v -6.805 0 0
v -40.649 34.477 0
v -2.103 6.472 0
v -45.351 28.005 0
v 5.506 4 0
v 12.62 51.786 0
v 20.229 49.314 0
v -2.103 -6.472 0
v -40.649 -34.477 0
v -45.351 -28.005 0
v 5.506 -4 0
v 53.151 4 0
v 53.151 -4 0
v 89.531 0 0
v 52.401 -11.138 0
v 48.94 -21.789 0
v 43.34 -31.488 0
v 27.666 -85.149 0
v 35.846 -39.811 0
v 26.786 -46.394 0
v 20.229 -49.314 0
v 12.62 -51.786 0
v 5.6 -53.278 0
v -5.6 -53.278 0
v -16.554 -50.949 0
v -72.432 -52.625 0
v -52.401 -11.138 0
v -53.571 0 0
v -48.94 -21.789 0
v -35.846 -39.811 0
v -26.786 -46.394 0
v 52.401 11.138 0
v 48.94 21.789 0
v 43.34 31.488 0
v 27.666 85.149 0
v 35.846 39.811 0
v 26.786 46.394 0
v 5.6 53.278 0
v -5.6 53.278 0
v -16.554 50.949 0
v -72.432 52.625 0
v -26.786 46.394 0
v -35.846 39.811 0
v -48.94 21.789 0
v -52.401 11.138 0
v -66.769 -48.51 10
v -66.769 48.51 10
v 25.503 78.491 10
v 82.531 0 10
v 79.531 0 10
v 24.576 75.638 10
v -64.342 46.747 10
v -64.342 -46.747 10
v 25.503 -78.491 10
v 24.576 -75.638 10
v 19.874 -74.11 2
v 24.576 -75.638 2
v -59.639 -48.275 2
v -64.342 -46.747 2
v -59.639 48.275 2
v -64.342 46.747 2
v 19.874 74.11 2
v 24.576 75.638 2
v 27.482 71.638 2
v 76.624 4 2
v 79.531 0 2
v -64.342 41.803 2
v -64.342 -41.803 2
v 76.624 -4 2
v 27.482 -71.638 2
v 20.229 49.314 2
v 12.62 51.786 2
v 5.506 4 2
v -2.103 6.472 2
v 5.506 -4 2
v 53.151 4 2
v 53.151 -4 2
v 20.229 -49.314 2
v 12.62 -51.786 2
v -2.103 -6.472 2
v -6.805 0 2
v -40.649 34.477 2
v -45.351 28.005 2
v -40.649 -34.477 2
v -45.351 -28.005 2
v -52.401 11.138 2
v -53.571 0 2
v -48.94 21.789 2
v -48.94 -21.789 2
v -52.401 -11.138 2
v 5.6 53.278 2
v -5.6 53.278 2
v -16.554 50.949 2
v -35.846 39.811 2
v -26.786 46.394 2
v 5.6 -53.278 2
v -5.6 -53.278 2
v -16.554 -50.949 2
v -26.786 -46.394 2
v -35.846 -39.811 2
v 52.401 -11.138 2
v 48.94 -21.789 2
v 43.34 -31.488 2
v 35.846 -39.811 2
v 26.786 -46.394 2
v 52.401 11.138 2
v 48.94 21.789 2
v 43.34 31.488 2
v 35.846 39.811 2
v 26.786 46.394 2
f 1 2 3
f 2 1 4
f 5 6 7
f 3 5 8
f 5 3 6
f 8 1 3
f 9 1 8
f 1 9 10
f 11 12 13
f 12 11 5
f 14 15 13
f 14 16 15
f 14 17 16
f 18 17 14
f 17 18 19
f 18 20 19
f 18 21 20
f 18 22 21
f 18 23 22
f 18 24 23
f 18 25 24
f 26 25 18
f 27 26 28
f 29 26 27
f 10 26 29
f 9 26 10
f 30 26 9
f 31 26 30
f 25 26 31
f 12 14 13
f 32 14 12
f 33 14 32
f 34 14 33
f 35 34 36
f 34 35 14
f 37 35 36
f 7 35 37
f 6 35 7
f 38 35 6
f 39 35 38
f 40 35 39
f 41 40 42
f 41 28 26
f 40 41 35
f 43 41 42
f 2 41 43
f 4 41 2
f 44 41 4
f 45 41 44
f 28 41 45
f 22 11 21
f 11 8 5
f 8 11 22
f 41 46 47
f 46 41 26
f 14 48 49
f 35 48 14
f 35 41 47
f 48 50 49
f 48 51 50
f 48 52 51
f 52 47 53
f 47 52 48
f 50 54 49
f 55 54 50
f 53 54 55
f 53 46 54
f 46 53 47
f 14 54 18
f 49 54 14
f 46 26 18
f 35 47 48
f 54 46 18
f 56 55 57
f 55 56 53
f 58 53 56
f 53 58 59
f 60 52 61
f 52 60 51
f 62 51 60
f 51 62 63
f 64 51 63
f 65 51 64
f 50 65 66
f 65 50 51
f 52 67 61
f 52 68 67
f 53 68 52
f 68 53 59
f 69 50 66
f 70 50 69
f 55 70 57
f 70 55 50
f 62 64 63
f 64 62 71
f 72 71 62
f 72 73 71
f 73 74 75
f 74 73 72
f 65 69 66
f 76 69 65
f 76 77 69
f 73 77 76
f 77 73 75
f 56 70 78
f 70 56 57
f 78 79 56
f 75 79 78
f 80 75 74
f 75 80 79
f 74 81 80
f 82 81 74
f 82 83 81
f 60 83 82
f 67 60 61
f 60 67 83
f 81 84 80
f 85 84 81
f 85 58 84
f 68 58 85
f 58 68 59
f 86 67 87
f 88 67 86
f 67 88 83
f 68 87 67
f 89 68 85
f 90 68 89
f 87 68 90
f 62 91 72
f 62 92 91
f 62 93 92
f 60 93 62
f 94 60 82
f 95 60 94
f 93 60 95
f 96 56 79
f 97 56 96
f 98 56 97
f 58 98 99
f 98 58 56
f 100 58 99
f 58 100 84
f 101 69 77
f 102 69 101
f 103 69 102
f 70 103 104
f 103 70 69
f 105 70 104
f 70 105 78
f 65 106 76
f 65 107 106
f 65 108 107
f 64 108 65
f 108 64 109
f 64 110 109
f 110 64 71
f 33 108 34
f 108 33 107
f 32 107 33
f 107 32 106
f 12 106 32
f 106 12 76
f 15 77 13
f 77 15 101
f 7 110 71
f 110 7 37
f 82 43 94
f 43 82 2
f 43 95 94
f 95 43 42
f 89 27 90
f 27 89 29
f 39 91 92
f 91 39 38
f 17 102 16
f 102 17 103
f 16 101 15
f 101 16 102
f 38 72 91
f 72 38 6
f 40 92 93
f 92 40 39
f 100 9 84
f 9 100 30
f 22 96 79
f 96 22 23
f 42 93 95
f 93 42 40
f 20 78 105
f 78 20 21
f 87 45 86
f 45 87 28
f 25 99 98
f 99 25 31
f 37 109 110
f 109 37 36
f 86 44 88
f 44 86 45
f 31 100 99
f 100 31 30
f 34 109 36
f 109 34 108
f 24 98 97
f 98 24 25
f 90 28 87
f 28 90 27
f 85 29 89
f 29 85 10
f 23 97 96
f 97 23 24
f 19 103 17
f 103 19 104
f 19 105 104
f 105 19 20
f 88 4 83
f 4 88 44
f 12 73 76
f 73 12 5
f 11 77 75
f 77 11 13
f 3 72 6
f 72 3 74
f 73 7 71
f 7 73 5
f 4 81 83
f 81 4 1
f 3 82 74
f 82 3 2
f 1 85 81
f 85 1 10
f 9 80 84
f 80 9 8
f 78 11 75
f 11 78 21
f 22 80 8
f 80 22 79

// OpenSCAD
/*

  stand.gcad

  dia * 0.588 = sec

*/

ikosidodekaederSecLen = 90;

ikosidodekaederDia = ikosidodekaederSecLen / 0.588;

standLowerDia = ikosidodekaederDia + 26;
standUpperDia = ikosidodekaederDia + 12;
standHeight = 10;
ikosidodekaederOuterDia = ikosidodekaederDia+6;
bottomHeight = 2;

difference() {
  cylinder(d1=standLowerDia, d2=standUpperDia,standHeight, $fn=5);
  
  /* cutout for the ikosidodekaeder itself */
  translate([0,0,bottomHeight])
  cylinder(d=ikosidodekaederOuterDia,standHeight, $fn=5);
  
  /* cutout on the buttom to reduce printing material and time */
  translate([0,0,-0.01])
  cylinder(d=ikosidodekaederDia*0.7, standHeight);
}

for(w = [0:4] ) {
  rotate([0,0,w*360/5])
  translate([standUpperDia/2/2,0,bottomHeight/2])
  cube([standUpperDia/2, 8, bottomHeight], center=true);
}
